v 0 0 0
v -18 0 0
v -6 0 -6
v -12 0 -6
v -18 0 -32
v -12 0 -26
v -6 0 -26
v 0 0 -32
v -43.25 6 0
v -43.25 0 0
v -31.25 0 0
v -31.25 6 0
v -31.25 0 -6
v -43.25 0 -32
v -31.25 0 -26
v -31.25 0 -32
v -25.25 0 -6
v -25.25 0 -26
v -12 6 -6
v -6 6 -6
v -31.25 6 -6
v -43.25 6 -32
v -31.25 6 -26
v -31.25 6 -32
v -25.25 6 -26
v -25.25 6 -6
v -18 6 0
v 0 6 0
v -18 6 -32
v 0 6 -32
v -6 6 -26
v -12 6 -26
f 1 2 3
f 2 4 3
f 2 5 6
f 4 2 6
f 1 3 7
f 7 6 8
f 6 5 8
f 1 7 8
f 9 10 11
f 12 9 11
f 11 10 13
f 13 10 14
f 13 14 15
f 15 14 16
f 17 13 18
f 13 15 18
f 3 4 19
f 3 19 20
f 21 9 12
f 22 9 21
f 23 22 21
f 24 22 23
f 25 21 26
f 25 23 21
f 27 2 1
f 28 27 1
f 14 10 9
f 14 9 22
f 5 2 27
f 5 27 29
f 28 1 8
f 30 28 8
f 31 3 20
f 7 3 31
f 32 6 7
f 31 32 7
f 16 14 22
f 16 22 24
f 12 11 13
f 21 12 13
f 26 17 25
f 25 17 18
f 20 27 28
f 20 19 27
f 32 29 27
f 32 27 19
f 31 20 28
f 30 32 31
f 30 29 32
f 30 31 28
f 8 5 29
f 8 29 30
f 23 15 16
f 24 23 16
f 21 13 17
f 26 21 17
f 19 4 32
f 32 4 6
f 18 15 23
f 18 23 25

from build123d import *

# Parameters (mm, degrees)
SKETCH1_W           = 12
SKETCH1_H           = 32
SKETCH1_W_2         = 6
SKETCH1_H_2         = 20
SKETCH1_W_3         = 18
BOSS_EXTRUDE1_DEPTH = 6


with BuildPart() as part:
    # Sketch1 → Boss-Extrude1 (new body)
    # profile 1 of 3: a face of its own
    with BuildSketch(Plane(origin=(0, 0, 0), x_dir=(1, 0, 0), z_dir=(0, 1, 0))):
        with Locations((-37.25, 16)):
            Rectangle(SKETCH1_W, SKETCH1_H)
    # profile 2 of 3: a face of its own
    with BuildSketch(Plane(origin=(0, 0, 0), x_dir=(1, 0, 0), z_dir=(0, 1, 0))):
        with Locations((-28.25, 16)):
            Rectangle(SKETCH1_W_2, SKETCH1_H_2)
    # profile 3 of 3: a face of its own
    with BuildSketch(Plane(origin=(0, 0, 0), x_dir=(1, 0, 0), z_dir=(0, 1, 0))):
        with Locations((-9, 16)):
            Rectangle(SKETCH1_W_3, SKETCH1_H)
        with Locations((-9, 16)):
            Rectangle(SKETCH1_W_2, SKETCH1_H_2, mode=Mode.SUBTRACT)
    extrude(amount=BOSS_EXTRUDE1_DEPTH)


solid = part.part
